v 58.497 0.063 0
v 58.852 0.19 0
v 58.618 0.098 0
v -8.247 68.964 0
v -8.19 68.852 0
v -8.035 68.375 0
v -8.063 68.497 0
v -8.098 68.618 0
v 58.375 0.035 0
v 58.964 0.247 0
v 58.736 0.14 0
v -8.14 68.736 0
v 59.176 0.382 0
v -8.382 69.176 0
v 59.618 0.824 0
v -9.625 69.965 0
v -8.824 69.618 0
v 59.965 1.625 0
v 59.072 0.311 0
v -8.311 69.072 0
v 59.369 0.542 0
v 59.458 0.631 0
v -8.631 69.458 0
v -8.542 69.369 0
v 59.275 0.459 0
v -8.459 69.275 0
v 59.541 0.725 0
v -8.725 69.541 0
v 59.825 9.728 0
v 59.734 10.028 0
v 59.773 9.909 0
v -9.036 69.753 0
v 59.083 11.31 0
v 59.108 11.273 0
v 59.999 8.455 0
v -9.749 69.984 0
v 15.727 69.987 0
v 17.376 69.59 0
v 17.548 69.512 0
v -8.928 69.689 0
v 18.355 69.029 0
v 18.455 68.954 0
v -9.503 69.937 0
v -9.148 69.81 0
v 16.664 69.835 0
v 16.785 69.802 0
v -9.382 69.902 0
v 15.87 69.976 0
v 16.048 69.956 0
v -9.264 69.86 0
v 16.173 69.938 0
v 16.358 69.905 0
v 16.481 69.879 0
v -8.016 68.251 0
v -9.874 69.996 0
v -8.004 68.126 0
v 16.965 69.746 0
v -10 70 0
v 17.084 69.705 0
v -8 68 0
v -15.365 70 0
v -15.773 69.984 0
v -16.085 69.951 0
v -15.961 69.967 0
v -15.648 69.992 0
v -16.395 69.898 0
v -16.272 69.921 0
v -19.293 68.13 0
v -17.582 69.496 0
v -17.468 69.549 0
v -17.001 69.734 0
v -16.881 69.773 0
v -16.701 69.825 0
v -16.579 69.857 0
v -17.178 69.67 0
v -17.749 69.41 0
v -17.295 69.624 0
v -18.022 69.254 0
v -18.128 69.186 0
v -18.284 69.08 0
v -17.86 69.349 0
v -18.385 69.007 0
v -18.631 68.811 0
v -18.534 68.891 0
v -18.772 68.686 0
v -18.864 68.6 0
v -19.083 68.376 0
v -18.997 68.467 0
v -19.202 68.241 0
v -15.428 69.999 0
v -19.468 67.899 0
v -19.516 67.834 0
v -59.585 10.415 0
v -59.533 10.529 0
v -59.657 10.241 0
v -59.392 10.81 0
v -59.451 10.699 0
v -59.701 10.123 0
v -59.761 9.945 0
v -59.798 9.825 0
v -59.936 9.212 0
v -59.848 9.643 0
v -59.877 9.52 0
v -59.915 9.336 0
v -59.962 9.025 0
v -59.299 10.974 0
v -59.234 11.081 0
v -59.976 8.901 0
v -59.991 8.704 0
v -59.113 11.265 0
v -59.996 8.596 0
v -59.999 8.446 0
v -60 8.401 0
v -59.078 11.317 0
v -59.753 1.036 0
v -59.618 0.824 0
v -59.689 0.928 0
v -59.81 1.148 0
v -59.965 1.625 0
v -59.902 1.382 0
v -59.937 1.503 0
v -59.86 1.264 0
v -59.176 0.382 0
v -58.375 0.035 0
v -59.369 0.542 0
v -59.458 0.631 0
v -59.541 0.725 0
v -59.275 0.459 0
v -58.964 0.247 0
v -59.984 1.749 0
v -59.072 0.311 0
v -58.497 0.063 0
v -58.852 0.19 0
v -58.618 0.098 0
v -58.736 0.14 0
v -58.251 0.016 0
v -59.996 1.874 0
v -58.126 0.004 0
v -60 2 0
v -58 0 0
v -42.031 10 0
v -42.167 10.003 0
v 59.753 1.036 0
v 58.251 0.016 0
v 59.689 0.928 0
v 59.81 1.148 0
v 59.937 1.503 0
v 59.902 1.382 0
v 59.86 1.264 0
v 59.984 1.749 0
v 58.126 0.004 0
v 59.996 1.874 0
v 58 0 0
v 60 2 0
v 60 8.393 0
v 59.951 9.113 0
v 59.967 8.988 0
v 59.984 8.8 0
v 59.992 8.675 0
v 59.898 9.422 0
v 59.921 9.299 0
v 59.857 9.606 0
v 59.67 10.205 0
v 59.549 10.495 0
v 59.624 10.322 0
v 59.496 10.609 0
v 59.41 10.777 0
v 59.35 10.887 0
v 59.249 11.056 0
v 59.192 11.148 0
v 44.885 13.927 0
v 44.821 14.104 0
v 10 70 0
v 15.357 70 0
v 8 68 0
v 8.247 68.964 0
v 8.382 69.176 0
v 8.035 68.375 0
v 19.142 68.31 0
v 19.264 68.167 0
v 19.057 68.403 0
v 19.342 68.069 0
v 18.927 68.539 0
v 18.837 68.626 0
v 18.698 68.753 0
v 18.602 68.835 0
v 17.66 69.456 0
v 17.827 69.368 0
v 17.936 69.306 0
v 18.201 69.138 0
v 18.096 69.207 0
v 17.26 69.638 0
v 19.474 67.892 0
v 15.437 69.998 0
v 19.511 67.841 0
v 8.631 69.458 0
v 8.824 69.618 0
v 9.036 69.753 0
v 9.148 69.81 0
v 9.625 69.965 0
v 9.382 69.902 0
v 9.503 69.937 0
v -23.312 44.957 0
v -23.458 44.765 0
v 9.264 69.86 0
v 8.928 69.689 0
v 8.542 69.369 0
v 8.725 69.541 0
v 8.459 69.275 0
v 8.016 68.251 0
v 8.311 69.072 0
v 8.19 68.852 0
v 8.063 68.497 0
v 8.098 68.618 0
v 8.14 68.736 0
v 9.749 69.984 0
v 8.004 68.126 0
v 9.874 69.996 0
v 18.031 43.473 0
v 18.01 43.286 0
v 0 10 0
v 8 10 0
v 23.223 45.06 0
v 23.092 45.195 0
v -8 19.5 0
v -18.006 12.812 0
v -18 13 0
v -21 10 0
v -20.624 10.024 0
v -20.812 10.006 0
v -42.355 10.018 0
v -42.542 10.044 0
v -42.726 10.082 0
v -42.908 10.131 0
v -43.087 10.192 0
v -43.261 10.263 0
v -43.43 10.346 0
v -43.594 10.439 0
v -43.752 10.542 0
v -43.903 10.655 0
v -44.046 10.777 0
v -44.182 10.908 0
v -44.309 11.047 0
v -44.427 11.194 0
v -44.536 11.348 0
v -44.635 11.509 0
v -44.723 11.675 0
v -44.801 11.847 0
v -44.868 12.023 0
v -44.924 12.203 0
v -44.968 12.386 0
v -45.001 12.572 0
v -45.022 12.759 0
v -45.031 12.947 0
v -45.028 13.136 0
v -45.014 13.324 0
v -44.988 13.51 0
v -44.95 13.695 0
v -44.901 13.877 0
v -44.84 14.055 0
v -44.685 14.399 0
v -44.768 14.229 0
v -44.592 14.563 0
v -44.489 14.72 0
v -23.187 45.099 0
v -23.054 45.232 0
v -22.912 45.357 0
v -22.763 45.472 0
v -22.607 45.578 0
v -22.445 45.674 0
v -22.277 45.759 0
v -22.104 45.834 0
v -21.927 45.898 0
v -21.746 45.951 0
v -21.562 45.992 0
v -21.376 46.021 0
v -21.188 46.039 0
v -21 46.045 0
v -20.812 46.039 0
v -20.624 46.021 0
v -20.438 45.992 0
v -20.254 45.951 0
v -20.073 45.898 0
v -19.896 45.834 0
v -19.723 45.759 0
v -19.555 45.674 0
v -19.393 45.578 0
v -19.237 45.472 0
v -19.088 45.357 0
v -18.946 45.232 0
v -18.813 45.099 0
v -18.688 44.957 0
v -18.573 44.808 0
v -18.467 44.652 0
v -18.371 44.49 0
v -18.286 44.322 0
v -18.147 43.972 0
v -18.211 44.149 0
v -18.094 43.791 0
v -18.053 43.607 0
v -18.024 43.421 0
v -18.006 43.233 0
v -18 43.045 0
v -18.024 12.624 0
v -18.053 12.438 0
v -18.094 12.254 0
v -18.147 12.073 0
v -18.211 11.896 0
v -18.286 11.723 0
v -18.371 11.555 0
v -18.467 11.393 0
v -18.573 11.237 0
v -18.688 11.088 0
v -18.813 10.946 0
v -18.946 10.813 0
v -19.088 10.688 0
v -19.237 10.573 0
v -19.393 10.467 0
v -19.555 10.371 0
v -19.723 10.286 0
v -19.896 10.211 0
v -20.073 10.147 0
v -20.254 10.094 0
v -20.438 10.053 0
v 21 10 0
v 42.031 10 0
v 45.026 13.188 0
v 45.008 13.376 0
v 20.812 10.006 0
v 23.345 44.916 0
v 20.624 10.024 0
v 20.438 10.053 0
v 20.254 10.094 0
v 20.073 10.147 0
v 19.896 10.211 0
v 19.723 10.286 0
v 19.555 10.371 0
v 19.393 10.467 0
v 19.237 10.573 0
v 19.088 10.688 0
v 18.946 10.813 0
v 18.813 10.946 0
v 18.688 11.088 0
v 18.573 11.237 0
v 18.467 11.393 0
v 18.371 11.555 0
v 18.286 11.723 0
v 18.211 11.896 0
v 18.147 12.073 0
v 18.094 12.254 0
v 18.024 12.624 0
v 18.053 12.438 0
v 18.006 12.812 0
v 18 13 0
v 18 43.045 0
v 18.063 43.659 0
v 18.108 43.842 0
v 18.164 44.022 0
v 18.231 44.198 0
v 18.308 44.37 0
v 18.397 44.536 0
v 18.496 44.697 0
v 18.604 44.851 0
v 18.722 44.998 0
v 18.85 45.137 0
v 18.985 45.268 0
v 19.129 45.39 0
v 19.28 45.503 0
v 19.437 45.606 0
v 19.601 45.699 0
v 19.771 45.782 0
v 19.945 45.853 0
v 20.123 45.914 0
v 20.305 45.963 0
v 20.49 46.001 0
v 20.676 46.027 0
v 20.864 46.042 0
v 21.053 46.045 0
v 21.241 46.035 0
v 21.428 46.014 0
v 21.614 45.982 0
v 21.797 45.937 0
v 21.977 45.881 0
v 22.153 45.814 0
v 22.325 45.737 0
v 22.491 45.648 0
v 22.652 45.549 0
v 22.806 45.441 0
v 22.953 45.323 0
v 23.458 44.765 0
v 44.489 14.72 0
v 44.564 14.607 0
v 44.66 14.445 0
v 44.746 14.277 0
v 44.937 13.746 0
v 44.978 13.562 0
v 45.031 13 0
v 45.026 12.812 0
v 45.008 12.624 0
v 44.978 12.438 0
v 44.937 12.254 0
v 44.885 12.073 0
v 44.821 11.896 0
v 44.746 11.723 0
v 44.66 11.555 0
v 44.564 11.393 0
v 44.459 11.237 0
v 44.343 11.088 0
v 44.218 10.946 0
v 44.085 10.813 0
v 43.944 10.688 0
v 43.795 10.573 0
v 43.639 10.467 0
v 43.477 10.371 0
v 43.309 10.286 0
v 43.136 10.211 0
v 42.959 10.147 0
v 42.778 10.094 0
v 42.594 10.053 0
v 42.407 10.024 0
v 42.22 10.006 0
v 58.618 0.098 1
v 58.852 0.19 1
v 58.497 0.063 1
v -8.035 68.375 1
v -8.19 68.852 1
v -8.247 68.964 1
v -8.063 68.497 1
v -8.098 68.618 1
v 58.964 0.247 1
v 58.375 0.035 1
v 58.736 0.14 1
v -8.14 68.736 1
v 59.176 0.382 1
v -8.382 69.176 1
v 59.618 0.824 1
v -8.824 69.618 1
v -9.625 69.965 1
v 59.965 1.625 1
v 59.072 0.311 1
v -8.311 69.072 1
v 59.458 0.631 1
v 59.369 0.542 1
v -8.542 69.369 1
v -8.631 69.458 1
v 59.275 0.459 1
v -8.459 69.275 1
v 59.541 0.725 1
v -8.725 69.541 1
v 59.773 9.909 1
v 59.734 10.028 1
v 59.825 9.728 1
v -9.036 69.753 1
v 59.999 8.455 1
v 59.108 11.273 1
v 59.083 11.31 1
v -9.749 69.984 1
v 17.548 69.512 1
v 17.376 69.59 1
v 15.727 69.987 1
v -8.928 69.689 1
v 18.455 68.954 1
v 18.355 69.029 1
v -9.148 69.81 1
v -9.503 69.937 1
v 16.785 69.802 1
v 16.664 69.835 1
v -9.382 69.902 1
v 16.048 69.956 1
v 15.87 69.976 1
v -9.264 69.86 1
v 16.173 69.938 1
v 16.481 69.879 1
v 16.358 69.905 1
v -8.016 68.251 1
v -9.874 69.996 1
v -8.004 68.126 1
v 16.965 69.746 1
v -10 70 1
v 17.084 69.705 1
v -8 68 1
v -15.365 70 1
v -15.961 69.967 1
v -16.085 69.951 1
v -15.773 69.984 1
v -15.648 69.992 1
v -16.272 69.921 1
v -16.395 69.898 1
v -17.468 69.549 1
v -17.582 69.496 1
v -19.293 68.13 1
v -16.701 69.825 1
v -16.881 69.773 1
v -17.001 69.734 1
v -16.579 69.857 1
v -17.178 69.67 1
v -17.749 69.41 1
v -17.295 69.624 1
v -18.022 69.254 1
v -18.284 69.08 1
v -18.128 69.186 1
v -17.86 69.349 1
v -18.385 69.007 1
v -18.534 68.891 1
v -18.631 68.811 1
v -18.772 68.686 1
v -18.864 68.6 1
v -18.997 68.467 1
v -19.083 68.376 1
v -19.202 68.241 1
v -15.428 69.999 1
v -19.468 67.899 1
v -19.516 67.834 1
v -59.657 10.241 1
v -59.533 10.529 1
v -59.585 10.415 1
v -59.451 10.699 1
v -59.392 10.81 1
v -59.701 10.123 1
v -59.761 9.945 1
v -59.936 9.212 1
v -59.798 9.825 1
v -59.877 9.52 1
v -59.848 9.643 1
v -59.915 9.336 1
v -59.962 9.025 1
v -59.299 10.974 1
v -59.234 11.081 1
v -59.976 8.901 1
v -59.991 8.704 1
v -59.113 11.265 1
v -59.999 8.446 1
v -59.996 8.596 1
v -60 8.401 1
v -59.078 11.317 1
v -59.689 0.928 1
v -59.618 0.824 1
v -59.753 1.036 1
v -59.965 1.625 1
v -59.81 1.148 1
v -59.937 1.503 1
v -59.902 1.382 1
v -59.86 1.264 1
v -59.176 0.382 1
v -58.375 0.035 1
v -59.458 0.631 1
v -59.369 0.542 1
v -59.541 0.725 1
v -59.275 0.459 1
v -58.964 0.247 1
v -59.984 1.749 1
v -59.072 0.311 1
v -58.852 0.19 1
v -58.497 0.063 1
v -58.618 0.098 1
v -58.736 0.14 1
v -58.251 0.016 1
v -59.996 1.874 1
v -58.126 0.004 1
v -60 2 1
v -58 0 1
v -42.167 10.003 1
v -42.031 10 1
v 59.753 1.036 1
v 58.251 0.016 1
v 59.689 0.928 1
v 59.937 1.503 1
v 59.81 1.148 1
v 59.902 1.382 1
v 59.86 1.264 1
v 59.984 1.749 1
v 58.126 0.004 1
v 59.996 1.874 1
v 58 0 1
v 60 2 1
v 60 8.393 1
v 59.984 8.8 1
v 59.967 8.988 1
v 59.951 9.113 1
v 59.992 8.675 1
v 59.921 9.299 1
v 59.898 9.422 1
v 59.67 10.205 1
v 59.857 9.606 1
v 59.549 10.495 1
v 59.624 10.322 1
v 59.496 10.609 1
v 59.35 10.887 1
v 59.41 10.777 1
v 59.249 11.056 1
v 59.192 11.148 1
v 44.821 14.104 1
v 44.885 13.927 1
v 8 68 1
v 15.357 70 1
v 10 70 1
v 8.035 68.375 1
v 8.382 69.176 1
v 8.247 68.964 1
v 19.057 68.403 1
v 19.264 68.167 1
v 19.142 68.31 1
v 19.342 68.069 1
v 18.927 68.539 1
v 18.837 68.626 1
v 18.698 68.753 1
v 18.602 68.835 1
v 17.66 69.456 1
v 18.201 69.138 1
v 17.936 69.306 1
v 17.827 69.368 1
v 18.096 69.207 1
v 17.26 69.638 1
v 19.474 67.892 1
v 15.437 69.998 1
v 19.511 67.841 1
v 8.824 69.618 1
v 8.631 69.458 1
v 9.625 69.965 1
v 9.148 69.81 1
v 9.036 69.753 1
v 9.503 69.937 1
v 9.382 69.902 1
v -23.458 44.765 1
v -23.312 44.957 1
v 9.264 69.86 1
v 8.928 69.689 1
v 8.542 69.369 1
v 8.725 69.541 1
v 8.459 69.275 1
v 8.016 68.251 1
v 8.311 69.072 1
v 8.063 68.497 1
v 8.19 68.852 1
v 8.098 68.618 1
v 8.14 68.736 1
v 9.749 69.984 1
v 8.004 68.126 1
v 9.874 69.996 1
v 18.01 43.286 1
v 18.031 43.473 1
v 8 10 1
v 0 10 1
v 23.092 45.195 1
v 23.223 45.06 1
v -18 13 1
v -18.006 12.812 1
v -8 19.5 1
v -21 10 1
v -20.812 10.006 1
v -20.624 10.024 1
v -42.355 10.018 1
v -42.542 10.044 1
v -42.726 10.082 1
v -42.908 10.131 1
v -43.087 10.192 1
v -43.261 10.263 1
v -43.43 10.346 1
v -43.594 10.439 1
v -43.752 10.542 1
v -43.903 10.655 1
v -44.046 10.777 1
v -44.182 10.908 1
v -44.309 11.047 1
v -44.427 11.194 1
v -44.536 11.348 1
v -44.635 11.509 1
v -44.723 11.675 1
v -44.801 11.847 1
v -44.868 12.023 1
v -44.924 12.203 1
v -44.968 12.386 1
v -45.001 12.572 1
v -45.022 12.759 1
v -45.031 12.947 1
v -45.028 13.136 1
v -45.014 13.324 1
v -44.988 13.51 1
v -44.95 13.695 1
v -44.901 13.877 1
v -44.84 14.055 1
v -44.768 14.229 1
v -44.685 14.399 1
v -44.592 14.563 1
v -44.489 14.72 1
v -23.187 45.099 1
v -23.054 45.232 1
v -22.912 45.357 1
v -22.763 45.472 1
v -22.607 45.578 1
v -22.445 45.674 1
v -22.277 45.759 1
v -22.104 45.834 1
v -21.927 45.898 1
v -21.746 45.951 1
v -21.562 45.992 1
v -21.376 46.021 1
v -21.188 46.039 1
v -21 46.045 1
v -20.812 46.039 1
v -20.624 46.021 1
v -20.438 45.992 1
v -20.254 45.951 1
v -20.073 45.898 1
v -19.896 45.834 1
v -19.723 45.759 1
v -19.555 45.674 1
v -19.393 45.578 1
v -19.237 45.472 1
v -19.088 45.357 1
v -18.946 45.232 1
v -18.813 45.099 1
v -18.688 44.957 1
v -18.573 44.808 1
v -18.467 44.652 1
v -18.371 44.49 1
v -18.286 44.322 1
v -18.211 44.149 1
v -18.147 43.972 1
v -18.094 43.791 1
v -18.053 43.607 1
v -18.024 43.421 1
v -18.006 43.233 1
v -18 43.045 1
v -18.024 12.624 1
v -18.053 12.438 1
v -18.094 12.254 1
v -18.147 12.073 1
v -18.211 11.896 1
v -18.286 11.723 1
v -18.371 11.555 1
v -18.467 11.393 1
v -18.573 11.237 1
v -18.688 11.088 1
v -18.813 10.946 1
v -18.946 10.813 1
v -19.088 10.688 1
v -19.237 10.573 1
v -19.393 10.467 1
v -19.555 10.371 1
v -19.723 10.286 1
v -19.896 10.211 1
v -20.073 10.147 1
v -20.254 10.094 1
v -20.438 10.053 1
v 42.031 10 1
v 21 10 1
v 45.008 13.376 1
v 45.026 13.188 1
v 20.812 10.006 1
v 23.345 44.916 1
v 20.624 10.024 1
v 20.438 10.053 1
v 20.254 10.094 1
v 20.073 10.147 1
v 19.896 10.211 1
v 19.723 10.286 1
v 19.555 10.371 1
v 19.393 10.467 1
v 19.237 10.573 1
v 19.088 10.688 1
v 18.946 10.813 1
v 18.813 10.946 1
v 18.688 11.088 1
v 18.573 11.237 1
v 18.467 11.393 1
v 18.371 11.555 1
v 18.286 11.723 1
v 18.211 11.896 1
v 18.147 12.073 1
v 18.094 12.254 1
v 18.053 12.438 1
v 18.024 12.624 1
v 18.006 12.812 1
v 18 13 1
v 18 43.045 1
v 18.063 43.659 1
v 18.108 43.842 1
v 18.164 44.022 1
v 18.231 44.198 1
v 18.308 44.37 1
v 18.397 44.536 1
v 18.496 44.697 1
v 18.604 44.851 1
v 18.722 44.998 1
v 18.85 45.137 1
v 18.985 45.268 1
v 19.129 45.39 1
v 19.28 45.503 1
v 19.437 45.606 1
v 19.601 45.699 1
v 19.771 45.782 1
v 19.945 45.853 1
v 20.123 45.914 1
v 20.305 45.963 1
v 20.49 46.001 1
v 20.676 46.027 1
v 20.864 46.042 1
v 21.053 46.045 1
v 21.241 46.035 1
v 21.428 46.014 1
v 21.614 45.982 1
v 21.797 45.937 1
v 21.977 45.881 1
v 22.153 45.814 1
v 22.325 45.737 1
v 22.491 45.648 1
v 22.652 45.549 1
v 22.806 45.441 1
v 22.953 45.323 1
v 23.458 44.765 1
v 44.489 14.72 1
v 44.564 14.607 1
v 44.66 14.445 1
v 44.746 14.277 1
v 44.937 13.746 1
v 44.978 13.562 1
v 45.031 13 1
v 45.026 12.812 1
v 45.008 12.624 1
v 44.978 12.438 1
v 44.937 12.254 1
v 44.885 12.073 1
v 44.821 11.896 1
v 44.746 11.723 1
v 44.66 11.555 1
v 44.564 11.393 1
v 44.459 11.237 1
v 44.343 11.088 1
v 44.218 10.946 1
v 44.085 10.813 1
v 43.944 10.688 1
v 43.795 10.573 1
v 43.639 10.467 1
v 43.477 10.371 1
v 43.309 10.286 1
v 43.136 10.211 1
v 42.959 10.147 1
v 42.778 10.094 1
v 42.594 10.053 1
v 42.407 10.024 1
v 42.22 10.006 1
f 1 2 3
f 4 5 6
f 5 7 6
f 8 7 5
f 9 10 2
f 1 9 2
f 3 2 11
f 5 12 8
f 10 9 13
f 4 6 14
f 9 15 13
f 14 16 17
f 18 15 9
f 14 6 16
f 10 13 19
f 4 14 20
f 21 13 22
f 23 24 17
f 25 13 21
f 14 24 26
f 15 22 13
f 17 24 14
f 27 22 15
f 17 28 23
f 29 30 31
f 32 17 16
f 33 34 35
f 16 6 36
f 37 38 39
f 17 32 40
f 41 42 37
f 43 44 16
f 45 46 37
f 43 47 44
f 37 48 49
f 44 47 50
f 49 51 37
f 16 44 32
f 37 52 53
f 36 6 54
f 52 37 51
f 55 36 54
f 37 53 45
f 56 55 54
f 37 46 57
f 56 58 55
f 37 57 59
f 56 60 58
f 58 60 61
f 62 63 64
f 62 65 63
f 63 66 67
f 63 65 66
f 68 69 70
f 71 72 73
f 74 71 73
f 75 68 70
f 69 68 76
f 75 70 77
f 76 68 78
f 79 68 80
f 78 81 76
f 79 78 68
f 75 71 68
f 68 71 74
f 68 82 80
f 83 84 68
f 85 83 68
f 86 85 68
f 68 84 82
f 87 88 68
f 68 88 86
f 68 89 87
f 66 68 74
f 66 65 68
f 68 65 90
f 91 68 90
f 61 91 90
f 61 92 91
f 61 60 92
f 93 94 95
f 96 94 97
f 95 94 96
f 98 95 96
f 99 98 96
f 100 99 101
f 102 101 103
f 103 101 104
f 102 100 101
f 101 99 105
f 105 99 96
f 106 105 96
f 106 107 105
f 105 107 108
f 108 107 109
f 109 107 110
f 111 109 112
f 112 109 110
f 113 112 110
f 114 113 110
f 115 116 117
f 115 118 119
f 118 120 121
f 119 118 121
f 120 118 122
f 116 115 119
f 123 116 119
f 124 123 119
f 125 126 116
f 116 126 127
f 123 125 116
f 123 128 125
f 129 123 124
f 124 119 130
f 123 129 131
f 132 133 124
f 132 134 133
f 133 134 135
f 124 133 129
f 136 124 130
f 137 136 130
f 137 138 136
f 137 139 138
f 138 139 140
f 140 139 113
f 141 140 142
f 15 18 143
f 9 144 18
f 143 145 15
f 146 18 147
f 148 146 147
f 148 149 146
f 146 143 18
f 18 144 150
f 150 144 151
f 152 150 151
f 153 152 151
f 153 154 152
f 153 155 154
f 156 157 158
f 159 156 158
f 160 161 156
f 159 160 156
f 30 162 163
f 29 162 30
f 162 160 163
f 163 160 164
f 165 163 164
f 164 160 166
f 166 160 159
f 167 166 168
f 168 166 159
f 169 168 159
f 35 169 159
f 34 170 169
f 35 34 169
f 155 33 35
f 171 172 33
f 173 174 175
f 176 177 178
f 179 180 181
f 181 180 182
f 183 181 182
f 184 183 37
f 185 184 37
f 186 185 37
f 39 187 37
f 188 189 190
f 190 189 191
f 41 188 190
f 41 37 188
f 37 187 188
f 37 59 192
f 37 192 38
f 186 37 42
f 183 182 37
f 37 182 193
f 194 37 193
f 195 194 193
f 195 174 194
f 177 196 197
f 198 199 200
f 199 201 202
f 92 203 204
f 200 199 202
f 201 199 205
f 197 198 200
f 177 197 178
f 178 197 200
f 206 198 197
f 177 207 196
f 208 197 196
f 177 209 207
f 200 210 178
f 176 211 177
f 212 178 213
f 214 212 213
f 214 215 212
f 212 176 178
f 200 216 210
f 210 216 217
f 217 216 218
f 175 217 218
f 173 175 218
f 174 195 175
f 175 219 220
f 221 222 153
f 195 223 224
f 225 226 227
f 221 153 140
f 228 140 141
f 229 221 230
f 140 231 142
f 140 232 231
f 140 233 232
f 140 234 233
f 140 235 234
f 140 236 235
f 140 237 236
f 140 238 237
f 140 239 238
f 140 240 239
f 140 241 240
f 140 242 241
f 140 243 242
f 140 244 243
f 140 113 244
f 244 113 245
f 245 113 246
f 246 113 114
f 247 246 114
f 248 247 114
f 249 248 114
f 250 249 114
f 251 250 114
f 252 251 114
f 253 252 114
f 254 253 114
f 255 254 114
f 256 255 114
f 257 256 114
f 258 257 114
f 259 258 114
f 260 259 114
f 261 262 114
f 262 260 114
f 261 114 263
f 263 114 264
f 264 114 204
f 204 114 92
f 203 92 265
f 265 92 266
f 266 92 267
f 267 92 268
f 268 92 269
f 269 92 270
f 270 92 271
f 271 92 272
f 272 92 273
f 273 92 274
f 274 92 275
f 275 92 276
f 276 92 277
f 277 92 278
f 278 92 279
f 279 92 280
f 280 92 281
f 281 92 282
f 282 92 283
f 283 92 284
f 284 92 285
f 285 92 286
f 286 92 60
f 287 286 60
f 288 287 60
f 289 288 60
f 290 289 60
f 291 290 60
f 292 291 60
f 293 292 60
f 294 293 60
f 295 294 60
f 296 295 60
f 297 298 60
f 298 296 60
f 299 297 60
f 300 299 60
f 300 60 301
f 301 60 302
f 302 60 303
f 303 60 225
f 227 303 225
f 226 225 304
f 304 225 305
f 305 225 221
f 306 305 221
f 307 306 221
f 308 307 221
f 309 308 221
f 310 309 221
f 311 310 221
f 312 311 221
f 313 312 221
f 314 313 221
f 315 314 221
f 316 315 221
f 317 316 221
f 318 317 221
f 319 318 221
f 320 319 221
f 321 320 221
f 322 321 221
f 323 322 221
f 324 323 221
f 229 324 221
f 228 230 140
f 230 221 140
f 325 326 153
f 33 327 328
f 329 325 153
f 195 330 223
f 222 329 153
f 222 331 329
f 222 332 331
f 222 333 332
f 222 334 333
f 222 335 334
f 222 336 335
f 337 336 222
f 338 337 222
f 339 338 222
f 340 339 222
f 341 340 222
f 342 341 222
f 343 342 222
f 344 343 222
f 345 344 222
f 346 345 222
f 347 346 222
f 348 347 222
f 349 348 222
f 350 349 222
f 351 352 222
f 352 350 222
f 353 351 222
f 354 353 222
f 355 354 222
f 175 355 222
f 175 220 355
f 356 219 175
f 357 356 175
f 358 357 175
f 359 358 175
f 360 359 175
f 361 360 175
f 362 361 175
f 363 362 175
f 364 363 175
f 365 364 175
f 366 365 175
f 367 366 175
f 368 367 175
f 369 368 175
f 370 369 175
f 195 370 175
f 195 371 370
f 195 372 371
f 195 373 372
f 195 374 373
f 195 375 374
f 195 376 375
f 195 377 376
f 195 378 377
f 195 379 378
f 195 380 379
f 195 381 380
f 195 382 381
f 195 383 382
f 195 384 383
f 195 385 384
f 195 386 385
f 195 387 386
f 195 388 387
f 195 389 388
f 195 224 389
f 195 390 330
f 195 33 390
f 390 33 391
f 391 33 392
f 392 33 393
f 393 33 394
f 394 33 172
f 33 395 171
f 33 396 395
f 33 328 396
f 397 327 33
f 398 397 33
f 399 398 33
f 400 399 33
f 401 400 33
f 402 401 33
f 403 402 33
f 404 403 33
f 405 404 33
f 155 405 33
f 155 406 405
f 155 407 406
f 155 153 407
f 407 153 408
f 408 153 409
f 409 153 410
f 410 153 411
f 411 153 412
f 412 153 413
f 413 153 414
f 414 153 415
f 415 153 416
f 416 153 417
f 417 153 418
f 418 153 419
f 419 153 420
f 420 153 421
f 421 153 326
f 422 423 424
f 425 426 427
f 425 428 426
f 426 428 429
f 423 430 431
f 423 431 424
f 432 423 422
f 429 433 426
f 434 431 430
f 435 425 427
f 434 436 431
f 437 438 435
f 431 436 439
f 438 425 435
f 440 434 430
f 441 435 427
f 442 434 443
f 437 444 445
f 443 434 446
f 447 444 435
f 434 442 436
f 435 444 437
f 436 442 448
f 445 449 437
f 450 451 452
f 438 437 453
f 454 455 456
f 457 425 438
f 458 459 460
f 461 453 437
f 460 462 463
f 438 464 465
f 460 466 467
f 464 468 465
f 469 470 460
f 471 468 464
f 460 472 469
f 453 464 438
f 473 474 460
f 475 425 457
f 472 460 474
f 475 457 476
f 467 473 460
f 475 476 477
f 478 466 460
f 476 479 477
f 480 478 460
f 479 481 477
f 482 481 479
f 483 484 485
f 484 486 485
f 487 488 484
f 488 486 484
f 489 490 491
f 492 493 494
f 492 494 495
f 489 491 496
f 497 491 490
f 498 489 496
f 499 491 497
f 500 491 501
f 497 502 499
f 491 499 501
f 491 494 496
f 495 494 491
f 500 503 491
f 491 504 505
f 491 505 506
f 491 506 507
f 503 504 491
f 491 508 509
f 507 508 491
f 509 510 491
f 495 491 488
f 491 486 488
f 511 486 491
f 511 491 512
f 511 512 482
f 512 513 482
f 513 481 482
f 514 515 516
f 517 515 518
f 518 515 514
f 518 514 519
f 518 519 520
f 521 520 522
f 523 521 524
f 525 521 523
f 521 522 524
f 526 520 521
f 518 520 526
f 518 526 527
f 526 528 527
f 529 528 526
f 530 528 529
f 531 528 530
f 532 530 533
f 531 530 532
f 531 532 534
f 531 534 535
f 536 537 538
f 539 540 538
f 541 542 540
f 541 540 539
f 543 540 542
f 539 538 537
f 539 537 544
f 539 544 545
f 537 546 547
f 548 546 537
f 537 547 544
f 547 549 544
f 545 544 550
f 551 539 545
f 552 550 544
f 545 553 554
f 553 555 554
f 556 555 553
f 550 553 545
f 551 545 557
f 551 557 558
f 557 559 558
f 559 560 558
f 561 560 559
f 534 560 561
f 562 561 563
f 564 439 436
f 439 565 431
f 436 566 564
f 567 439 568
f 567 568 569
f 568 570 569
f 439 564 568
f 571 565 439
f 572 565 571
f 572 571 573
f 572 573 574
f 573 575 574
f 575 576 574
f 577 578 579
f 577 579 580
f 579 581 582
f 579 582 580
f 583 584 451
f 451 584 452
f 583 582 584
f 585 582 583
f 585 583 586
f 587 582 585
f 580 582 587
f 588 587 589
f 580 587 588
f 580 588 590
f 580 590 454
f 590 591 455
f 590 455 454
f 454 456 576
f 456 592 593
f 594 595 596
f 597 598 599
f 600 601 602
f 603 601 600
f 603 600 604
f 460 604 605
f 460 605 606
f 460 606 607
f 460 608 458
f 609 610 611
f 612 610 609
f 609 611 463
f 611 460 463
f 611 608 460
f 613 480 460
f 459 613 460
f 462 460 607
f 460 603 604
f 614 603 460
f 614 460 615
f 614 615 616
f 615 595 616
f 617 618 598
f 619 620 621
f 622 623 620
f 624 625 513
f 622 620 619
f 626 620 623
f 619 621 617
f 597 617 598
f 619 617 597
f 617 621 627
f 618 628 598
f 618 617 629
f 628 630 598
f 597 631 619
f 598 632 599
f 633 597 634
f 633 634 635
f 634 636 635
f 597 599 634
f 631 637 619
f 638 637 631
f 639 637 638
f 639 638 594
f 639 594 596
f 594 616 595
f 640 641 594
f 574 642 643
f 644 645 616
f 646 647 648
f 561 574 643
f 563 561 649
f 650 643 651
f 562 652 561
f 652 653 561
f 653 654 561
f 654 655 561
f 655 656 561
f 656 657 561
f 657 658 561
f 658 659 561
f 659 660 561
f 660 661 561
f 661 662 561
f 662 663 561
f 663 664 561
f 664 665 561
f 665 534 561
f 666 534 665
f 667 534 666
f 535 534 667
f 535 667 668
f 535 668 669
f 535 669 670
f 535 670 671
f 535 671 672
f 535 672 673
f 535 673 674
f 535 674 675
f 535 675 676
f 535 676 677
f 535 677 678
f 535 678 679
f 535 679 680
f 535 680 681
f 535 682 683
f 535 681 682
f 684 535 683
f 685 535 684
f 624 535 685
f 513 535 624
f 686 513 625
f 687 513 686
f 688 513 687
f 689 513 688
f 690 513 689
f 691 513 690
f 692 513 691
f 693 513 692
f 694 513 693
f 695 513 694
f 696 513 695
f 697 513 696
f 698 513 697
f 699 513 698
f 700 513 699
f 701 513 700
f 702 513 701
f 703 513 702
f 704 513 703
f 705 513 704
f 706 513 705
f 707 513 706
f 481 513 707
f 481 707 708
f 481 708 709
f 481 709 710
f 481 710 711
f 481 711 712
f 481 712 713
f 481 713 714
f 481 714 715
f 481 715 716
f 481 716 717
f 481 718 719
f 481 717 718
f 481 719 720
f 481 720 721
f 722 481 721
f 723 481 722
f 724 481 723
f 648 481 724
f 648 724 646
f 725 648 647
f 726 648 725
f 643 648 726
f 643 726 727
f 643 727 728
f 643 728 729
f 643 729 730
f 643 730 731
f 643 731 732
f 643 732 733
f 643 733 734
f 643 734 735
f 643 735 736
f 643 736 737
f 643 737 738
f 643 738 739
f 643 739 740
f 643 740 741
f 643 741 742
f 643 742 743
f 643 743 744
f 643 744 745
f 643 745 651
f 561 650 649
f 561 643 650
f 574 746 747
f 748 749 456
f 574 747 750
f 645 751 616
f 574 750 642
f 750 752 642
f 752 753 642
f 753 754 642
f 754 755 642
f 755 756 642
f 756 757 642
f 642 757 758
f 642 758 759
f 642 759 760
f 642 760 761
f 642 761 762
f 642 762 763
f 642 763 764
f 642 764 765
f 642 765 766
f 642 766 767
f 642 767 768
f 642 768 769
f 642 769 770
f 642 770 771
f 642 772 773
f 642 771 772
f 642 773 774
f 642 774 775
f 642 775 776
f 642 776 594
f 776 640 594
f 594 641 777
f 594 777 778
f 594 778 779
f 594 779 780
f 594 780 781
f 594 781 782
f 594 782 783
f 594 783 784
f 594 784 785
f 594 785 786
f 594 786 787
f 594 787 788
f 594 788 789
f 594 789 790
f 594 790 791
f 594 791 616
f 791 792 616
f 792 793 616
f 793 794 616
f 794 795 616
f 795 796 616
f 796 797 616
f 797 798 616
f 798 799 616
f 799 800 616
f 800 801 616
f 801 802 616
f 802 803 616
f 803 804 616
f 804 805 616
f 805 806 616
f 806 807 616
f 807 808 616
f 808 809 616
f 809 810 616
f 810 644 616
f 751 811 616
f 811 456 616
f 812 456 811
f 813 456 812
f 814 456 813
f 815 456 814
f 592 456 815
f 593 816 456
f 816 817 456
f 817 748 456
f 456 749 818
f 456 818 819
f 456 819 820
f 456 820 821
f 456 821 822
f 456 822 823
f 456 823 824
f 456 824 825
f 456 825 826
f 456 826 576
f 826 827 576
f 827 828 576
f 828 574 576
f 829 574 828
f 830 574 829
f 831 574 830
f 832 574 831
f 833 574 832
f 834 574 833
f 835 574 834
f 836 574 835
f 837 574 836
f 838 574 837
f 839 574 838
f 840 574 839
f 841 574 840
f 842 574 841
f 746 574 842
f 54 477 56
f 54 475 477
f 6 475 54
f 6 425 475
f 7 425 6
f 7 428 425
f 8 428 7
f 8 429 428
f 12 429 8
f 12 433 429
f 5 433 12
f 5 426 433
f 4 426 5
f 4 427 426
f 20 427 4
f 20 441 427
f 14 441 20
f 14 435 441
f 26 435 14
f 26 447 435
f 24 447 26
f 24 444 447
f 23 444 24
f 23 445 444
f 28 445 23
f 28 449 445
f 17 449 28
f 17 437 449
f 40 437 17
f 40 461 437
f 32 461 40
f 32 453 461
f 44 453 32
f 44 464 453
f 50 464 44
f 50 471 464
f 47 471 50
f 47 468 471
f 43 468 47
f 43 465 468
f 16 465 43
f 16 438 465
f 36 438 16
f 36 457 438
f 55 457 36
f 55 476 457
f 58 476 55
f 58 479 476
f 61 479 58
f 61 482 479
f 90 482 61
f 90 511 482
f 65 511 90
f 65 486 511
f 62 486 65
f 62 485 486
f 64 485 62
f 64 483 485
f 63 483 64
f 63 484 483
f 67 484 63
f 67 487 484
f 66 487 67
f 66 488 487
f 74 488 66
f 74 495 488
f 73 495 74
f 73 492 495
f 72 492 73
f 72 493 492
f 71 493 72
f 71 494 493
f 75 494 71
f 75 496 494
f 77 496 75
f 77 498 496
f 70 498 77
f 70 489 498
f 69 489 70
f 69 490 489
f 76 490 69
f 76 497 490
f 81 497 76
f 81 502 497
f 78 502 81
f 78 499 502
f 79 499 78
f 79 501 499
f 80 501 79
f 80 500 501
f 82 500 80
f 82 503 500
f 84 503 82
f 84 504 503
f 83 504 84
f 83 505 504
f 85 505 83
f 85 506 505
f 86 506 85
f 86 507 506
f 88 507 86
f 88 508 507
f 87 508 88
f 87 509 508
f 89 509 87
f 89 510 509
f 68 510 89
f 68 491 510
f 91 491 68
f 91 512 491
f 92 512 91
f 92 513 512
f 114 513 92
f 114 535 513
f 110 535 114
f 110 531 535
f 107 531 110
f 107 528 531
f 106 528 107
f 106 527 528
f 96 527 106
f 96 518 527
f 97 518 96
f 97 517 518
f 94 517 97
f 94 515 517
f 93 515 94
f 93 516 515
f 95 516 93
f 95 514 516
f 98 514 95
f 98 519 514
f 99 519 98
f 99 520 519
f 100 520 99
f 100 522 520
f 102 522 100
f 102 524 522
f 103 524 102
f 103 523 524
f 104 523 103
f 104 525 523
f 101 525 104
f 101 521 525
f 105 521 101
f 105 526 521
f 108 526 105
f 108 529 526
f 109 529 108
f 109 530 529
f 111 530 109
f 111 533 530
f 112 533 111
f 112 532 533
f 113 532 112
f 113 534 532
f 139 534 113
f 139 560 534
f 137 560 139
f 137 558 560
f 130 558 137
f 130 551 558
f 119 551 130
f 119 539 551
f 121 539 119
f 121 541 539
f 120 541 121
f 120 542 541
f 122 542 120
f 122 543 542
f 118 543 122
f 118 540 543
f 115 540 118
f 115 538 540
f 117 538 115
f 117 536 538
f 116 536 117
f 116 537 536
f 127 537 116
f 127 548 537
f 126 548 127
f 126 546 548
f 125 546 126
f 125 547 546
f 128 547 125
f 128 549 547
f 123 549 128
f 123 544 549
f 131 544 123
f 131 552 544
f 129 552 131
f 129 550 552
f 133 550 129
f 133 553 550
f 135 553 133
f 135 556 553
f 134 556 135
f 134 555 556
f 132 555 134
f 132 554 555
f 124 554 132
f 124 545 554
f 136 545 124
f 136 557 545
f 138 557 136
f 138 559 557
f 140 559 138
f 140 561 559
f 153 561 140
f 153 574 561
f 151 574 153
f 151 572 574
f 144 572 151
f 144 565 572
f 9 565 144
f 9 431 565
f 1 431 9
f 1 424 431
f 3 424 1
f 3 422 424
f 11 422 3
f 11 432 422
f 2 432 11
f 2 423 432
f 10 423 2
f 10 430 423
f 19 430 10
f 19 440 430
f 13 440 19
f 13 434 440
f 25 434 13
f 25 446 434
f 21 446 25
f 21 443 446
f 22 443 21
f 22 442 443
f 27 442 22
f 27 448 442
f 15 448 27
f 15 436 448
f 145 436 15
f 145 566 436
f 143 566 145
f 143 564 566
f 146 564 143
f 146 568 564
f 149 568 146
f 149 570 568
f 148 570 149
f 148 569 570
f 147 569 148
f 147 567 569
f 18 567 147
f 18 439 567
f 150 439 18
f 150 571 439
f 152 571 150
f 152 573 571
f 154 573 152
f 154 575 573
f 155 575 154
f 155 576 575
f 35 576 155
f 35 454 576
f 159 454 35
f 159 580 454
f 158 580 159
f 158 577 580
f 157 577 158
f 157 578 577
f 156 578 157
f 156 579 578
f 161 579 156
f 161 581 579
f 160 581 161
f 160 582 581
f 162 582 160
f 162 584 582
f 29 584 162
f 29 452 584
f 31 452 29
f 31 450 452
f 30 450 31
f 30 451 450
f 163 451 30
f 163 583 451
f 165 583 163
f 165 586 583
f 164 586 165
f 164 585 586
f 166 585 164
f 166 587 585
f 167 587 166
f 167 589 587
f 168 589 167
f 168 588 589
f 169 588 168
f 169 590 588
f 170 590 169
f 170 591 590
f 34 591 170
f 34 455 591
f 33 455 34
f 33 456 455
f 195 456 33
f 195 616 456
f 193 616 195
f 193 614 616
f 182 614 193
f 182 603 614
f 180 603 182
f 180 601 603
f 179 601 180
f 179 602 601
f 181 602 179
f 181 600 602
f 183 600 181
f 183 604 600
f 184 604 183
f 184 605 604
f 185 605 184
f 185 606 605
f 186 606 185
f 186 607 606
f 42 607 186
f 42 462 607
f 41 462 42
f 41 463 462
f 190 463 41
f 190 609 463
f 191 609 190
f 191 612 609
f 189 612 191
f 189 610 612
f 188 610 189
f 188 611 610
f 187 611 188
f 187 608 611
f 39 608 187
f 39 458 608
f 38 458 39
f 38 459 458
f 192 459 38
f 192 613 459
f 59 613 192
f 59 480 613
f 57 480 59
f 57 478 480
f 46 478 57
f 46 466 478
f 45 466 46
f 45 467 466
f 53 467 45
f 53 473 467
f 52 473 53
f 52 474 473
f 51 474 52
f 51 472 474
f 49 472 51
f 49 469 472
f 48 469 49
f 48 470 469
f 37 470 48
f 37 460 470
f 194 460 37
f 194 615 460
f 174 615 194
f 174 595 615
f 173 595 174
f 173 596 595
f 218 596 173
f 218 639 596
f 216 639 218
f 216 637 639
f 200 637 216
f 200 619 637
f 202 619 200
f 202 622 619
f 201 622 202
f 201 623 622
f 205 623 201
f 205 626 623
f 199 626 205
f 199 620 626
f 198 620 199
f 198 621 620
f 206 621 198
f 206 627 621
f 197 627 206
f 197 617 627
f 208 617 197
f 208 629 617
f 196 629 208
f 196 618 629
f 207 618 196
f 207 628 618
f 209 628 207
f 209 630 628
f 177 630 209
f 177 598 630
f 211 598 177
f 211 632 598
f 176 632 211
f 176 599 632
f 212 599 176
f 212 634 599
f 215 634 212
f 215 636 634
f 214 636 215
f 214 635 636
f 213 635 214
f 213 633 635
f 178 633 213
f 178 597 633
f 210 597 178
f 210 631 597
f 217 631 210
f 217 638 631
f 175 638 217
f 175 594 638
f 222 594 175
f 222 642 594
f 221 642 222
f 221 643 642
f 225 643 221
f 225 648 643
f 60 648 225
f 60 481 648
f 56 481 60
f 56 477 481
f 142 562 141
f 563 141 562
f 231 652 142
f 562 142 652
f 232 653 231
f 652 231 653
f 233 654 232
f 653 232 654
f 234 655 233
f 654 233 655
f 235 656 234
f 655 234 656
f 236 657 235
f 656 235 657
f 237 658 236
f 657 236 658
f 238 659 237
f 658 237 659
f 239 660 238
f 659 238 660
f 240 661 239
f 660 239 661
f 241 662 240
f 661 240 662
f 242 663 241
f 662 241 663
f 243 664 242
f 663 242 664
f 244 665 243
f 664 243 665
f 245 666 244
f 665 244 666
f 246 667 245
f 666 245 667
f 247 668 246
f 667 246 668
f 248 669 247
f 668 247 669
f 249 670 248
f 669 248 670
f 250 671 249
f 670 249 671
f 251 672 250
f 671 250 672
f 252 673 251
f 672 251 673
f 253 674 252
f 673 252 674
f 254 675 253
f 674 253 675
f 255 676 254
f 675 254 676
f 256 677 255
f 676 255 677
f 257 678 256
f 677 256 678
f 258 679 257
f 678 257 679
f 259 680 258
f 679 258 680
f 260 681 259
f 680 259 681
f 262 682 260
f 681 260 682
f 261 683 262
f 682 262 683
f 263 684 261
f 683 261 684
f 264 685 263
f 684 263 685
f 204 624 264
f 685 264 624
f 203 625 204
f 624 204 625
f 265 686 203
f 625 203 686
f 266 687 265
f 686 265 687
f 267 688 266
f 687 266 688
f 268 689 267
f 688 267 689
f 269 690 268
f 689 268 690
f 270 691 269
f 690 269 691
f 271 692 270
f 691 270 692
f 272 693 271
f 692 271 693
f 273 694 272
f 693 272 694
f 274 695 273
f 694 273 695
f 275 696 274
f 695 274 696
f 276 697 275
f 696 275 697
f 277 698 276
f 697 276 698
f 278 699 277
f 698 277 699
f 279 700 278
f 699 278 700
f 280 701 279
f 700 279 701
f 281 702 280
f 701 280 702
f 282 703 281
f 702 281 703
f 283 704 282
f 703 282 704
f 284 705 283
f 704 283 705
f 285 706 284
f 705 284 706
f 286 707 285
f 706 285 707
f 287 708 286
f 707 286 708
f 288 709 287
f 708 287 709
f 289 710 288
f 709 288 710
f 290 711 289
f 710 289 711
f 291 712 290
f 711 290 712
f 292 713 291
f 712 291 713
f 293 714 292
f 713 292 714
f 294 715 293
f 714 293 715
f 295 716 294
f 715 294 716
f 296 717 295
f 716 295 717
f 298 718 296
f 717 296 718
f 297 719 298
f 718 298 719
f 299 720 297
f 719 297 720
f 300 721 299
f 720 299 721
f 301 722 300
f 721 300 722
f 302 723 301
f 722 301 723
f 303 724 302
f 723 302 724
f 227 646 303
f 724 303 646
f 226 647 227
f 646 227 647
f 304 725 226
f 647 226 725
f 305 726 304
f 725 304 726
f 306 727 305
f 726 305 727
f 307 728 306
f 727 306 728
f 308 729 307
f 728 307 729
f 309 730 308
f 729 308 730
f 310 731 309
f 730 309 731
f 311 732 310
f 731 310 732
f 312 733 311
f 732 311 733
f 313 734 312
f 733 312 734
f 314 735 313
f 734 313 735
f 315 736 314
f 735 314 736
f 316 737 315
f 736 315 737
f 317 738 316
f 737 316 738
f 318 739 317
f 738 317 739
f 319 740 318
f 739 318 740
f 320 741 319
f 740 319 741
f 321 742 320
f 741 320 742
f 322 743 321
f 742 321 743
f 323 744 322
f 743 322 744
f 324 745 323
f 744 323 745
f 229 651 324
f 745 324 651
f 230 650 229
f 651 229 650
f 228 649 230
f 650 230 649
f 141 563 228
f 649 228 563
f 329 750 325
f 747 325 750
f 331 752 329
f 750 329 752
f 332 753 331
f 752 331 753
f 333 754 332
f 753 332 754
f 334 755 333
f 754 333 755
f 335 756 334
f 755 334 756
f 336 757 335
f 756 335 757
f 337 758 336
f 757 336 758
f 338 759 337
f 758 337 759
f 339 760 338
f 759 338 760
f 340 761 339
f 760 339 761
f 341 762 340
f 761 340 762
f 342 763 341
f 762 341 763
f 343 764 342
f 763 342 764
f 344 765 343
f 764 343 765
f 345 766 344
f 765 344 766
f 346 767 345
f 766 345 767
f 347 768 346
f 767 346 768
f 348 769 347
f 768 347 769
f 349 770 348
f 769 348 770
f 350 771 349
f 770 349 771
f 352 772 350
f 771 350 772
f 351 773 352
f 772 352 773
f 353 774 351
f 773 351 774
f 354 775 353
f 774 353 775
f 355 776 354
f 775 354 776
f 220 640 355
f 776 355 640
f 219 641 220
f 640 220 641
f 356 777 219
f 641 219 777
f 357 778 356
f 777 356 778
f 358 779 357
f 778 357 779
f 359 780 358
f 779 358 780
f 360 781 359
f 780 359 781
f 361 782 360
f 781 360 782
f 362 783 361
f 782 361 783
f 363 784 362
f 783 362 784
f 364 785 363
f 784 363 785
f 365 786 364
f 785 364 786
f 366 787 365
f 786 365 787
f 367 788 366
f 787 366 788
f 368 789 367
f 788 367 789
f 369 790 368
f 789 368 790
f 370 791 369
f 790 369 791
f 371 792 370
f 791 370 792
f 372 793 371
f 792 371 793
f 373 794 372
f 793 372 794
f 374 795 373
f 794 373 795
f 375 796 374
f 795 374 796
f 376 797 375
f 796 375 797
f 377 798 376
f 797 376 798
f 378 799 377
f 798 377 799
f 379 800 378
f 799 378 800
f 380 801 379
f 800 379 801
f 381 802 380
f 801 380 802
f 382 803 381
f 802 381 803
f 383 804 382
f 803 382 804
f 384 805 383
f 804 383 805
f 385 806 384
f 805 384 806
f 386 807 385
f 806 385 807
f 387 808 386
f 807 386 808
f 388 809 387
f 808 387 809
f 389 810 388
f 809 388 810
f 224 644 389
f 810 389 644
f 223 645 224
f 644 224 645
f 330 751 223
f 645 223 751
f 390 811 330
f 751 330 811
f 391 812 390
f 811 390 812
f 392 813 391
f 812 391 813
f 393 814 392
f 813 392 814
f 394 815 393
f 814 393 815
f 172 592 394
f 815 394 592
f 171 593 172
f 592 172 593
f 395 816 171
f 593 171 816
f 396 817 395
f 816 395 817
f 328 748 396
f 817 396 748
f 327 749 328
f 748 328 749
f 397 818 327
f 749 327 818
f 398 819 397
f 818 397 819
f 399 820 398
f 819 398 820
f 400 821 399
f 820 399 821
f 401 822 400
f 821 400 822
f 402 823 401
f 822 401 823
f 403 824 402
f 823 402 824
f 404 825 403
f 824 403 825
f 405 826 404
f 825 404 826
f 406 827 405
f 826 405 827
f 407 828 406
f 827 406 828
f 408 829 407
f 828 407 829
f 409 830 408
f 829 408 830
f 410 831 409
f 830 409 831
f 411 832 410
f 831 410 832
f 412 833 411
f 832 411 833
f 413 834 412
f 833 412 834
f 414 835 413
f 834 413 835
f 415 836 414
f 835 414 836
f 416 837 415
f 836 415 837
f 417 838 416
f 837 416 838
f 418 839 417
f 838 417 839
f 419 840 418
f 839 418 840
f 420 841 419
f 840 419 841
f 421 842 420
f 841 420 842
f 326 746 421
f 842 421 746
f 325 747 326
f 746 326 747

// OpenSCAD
$fn = 100;

module base_triangle()
{
    polygon(points = [
        [ 0, 0 ],
        [ 60, 0 ],
        [ 60, 10 ],
        [ 18, 70 ],
        [ -18, 70 ],
        [ -60, 10 ],
        [ -60, 0 ],
    ]);
}

module soft_base_triangle()
{
    offset(r = 5) offset(r = -5)
    {
        base_triangle();
    }
    polygon(points = [
        [ 60, 0 ],
        [ 60, 5 ],
        [ -60, 5 ],
        [ -60, 0 ],
    ]);
}

module softer_base_triangle()
{
    offset(r = 2) offset(r = -2)
    {
        difference()
        {
            soft_base_triangle();
            // to make round edges at entry of
            // laptop cutout
            polygon(points = [
                [ 8, 50 ],
                [ 8, 90 ],
                [ -8, 90 ],
                [ -8, 50 ],
            ]);
        }
    }
}

module laptop_cutout()
{
    polygon(points = [
        [ 8, 10 ],
        [ 8, 90 ],
        [ -8, 90 ],
        [ -8, 10 ],
    ]);
}

module outline()
{
    difference()
    {
        softer_base_triangle();
        laptop_cutout();
    }
}

module triangle_cutouts()
{
    offset(r = 3) offset(r = -13)
    {
        outline();
    }
}

module wedge()
{
    polygon(points = [
        [ -8, 19.5 ],
        [ 0, 10 ],
        [ -8, 10 ],
    ]);
}

module stand()
{
    difference()
    {
        outline();
        triangle_cutouts();
    }
    wedge();
}

linear_extrude(height = 1)
{
    stand();
}
